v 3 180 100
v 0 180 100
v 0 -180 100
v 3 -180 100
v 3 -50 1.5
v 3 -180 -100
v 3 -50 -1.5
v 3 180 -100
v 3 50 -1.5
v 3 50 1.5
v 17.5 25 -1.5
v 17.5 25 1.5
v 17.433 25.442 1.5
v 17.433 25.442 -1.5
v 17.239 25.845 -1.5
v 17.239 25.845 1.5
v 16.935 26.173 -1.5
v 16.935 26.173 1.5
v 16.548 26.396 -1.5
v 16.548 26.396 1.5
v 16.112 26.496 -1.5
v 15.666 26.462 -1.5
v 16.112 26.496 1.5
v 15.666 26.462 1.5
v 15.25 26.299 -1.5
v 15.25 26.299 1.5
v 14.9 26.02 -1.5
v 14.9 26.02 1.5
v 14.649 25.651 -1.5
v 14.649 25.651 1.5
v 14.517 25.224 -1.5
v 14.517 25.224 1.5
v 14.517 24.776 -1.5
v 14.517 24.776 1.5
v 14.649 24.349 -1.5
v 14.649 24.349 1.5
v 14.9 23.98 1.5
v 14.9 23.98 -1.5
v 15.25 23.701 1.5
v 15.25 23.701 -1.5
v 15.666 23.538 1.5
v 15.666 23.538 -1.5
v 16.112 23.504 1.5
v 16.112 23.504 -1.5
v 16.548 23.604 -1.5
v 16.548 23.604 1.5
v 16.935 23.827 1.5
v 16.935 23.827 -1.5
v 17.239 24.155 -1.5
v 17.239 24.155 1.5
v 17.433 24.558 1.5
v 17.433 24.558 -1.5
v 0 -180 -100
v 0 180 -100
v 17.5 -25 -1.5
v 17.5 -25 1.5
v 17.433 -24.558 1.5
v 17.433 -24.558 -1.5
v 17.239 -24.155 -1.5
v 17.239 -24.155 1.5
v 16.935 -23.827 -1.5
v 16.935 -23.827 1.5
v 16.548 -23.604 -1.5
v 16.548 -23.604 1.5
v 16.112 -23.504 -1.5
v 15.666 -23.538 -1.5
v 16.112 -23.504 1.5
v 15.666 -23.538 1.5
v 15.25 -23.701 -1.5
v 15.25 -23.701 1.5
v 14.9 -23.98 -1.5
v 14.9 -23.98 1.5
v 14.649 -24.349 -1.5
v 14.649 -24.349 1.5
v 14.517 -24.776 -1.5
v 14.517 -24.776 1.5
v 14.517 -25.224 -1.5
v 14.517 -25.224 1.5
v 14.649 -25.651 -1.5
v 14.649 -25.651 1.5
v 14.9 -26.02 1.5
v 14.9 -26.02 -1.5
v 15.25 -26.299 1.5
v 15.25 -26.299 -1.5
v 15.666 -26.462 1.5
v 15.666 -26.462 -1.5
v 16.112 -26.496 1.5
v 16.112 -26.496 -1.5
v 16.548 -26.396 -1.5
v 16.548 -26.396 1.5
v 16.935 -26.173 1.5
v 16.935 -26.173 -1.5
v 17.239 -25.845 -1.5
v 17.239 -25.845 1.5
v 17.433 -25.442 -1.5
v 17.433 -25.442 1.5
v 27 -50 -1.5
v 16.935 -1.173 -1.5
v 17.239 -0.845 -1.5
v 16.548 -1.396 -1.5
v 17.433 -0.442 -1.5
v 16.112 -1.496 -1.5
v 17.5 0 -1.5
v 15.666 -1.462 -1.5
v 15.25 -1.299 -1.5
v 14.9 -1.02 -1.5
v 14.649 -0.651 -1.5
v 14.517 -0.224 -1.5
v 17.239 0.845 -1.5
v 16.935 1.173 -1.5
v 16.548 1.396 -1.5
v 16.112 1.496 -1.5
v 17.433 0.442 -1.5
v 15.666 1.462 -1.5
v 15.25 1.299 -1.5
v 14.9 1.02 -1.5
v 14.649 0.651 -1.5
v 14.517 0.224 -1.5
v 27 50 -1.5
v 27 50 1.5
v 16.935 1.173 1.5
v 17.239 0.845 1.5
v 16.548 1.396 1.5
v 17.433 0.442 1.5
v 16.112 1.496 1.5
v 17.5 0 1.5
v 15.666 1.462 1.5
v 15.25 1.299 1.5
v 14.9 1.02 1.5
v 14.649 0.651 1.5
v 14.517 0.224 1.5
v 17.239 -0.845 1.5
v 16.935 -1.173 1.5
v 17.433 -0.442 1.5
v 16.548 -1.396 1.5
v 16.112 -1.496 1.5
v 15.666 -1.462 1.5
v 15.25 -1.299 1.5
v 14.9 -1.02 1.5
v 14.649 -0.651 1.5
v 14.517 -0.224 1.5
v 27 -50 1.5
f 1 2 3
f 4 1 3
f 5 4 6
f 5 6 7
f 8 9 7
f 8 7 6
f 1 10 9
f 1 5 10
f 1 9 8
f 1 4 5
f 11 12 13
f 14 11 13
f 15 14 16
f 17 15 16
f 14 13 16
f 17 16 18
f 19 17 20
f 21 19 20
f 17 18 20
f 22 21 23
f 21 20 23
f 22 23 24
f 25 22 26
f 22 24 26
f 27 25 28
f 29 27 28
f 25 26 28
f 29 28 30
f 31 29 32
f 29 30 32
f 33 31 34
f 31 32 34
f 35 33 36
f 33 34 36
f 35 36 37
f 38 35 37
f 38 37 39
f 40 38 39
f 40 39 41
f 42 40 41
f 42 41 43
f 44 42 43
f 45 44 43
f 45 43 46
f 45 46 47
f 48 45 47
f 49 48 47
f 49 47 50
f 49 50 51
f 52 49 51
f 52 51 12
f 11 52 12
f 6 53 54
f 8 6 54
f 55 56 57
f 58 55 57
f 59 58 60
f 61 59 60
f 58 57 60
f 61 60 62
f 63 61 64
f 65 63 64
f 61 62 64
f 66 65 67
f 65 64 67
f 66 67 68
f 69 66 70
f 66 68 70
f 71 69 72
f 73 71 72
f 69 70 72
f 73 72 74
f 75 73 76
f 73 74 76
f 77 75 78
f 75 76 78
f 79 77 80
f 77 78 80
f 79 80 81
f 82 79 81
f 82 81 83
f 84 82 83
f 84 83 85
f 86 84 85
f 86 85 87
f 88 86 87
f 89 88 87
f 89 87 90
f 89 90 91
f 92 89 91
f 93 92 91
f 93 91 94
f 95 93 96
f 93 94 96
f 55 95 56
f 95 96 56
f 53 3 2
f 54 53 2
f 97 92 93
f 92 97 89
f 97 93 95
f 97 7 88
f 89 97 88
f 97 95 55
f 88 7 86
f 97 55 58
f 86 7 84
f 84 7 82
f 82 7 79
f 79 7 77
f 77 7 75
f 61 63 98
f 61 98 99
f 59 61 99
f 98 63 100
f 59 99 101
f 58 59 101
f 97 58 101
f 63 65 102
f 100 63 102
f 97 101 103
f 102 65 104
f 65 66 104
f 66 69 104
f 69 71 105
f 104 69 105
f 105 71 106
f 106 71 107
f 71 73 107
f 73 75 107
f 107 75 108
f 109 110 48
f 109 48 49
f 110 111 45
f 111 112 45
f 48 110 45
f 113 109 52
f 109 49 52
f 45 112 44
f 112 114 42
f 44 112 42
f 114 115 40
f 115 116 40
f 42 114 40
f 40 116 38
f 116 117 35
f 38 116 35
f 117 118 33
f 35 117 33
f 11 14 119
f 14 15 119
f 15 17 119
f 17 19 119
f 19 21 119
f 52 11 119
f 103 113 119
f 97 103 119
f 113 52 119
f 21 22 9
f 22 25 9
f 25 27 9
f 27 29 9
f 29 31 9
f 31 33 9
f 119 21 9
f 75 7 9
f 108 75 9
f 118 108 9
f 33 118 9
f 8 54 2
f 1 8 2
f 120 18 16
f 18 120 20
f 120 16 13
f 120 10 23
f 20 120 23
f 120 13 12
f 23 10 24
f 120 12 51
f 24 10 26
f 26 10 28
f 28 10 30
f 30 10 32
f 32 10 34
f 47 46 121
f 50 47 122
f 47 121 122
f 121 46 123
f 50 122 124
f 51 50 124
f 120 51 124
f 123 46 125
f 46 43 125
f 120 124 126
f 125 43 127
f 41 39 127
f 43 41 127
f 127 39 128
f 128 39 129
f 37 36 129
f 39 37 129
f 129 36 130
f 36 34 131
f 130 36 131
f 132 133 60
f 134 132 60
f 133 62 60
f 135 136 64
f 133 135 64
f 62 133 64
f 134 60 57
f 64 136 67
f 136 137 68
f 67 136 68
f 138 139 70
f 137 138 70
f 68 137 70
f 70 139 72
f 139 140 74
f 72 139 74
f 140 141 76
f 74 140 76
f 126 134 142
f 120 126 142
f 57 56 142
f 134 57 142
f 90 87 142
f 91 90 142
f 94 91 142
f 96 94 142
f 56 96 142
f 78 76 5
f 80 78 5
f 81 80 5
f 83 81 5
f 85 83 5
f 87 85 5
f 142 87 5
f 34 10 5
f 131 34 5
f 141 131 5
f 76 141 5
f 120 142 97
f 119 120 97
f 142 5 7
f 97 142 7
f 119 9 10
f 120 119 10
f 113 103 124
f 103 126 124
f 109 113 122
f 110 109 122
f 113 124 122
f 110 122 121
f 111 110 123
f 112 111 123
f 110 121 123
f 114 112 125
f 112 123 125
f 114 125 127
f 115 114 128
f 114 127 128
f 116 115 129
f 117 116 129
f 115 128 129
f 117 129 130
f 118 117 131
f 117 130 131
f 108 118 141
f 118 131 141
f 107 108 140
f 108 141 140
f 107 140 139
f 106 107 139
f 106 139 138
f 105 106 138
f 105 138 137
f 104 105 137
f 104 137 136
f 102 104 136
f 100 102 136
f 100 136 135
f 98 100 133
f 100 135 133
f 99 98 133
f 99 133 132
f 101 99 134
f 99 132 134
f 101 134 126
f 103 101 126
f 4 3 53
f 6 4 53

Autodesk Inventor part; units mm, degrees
ref_plane "YZ Plane" through (0, 0, 0) normal (1, 0, 0) x (0, 1, 0)
ref_plane "XZ Plane" through (0, 0, 0) normal (0, 1, 0) x (-1, 0, 0)
ref_plane "XY Plane" through (0, 0, 0) normal (0, 0, 1) x (1, 0, 0)
sketch "Sketch1" plane through (0, 0, 0) normal (1, 0, 0) x (0, 1, 0)
  line L0 (180, 100) -> (-180, 100)
  line L1 (-180, 100) -> (-180, -100)
  line L2 (-180, -100) -> (180, -100)
  line L3 (180, -100) -> (180, 100)
  line L4 (180, 100) -> (-180, -100) construction
  line L5 (-180, 100) -> (180, -100) construction
  point P0 (0, 0)
  dimension "d0" = 360
  dimension "d1" = 200
extrude "Extrusion1" add sketch "Sketch1" along normal blind 3
sketch "Sketch7" plane through (3, 0, 0) normal (1, 0, 0) x (0, 0, -1)
  line L0 (1.5, 50) -> (-1.5, 50)
  line L1 (-1.5, 50) -> (-1.5, -50)
  line L2 (-1.5, -50) -> (1.5, -50)
  line L3 (1.5, -50) -> (1.5, 50)
  line L4 (1.5, 50) -> (-1.5, -50) construction
  line L5 (-1.5, 50) -> (1.5, -50) construction
  point P0 (0, 0)
  dimension "d69" = 3
  dimension "d70" = 100
extrude "Extrusion10" add sketch "Sketch7" along normal blind 24
sketch "Sketch8" plane through (3, -50, 1.5) normal (0, 0, 1) x (1, 0, 0)
  circle A0 centre (13, 75) radius 1.5
  circle A1 centre (13, 50) radius 1.5
  circle A2 centre (13, 25) radius 1.5
  line L0 (0, 100) -> (24, 100) projected
  line L1 (0, 0) -> (24, 0) projected
  line L2 (24, 100) -> (24, 0) projected
  line L3 (0, 230) -> (0, -130) projected
  point P0 (-3, 50)
  dimension "d73" = 3
  dimension "d74" = 3
  dimension "d75" = 3
  dimension "d76" = 25
  dimension "d77" = 25
  dimension "d78" = 25
  dimension "d87" = 25
  dimension "d88" = 11
  dimension "d89" = 11
  dimension "d90" = 11
extrude "Extrusion11" cut sketch "Sketch8" against normal blind 25 contours A0 | A1 | A2
properties part number "rightside"
